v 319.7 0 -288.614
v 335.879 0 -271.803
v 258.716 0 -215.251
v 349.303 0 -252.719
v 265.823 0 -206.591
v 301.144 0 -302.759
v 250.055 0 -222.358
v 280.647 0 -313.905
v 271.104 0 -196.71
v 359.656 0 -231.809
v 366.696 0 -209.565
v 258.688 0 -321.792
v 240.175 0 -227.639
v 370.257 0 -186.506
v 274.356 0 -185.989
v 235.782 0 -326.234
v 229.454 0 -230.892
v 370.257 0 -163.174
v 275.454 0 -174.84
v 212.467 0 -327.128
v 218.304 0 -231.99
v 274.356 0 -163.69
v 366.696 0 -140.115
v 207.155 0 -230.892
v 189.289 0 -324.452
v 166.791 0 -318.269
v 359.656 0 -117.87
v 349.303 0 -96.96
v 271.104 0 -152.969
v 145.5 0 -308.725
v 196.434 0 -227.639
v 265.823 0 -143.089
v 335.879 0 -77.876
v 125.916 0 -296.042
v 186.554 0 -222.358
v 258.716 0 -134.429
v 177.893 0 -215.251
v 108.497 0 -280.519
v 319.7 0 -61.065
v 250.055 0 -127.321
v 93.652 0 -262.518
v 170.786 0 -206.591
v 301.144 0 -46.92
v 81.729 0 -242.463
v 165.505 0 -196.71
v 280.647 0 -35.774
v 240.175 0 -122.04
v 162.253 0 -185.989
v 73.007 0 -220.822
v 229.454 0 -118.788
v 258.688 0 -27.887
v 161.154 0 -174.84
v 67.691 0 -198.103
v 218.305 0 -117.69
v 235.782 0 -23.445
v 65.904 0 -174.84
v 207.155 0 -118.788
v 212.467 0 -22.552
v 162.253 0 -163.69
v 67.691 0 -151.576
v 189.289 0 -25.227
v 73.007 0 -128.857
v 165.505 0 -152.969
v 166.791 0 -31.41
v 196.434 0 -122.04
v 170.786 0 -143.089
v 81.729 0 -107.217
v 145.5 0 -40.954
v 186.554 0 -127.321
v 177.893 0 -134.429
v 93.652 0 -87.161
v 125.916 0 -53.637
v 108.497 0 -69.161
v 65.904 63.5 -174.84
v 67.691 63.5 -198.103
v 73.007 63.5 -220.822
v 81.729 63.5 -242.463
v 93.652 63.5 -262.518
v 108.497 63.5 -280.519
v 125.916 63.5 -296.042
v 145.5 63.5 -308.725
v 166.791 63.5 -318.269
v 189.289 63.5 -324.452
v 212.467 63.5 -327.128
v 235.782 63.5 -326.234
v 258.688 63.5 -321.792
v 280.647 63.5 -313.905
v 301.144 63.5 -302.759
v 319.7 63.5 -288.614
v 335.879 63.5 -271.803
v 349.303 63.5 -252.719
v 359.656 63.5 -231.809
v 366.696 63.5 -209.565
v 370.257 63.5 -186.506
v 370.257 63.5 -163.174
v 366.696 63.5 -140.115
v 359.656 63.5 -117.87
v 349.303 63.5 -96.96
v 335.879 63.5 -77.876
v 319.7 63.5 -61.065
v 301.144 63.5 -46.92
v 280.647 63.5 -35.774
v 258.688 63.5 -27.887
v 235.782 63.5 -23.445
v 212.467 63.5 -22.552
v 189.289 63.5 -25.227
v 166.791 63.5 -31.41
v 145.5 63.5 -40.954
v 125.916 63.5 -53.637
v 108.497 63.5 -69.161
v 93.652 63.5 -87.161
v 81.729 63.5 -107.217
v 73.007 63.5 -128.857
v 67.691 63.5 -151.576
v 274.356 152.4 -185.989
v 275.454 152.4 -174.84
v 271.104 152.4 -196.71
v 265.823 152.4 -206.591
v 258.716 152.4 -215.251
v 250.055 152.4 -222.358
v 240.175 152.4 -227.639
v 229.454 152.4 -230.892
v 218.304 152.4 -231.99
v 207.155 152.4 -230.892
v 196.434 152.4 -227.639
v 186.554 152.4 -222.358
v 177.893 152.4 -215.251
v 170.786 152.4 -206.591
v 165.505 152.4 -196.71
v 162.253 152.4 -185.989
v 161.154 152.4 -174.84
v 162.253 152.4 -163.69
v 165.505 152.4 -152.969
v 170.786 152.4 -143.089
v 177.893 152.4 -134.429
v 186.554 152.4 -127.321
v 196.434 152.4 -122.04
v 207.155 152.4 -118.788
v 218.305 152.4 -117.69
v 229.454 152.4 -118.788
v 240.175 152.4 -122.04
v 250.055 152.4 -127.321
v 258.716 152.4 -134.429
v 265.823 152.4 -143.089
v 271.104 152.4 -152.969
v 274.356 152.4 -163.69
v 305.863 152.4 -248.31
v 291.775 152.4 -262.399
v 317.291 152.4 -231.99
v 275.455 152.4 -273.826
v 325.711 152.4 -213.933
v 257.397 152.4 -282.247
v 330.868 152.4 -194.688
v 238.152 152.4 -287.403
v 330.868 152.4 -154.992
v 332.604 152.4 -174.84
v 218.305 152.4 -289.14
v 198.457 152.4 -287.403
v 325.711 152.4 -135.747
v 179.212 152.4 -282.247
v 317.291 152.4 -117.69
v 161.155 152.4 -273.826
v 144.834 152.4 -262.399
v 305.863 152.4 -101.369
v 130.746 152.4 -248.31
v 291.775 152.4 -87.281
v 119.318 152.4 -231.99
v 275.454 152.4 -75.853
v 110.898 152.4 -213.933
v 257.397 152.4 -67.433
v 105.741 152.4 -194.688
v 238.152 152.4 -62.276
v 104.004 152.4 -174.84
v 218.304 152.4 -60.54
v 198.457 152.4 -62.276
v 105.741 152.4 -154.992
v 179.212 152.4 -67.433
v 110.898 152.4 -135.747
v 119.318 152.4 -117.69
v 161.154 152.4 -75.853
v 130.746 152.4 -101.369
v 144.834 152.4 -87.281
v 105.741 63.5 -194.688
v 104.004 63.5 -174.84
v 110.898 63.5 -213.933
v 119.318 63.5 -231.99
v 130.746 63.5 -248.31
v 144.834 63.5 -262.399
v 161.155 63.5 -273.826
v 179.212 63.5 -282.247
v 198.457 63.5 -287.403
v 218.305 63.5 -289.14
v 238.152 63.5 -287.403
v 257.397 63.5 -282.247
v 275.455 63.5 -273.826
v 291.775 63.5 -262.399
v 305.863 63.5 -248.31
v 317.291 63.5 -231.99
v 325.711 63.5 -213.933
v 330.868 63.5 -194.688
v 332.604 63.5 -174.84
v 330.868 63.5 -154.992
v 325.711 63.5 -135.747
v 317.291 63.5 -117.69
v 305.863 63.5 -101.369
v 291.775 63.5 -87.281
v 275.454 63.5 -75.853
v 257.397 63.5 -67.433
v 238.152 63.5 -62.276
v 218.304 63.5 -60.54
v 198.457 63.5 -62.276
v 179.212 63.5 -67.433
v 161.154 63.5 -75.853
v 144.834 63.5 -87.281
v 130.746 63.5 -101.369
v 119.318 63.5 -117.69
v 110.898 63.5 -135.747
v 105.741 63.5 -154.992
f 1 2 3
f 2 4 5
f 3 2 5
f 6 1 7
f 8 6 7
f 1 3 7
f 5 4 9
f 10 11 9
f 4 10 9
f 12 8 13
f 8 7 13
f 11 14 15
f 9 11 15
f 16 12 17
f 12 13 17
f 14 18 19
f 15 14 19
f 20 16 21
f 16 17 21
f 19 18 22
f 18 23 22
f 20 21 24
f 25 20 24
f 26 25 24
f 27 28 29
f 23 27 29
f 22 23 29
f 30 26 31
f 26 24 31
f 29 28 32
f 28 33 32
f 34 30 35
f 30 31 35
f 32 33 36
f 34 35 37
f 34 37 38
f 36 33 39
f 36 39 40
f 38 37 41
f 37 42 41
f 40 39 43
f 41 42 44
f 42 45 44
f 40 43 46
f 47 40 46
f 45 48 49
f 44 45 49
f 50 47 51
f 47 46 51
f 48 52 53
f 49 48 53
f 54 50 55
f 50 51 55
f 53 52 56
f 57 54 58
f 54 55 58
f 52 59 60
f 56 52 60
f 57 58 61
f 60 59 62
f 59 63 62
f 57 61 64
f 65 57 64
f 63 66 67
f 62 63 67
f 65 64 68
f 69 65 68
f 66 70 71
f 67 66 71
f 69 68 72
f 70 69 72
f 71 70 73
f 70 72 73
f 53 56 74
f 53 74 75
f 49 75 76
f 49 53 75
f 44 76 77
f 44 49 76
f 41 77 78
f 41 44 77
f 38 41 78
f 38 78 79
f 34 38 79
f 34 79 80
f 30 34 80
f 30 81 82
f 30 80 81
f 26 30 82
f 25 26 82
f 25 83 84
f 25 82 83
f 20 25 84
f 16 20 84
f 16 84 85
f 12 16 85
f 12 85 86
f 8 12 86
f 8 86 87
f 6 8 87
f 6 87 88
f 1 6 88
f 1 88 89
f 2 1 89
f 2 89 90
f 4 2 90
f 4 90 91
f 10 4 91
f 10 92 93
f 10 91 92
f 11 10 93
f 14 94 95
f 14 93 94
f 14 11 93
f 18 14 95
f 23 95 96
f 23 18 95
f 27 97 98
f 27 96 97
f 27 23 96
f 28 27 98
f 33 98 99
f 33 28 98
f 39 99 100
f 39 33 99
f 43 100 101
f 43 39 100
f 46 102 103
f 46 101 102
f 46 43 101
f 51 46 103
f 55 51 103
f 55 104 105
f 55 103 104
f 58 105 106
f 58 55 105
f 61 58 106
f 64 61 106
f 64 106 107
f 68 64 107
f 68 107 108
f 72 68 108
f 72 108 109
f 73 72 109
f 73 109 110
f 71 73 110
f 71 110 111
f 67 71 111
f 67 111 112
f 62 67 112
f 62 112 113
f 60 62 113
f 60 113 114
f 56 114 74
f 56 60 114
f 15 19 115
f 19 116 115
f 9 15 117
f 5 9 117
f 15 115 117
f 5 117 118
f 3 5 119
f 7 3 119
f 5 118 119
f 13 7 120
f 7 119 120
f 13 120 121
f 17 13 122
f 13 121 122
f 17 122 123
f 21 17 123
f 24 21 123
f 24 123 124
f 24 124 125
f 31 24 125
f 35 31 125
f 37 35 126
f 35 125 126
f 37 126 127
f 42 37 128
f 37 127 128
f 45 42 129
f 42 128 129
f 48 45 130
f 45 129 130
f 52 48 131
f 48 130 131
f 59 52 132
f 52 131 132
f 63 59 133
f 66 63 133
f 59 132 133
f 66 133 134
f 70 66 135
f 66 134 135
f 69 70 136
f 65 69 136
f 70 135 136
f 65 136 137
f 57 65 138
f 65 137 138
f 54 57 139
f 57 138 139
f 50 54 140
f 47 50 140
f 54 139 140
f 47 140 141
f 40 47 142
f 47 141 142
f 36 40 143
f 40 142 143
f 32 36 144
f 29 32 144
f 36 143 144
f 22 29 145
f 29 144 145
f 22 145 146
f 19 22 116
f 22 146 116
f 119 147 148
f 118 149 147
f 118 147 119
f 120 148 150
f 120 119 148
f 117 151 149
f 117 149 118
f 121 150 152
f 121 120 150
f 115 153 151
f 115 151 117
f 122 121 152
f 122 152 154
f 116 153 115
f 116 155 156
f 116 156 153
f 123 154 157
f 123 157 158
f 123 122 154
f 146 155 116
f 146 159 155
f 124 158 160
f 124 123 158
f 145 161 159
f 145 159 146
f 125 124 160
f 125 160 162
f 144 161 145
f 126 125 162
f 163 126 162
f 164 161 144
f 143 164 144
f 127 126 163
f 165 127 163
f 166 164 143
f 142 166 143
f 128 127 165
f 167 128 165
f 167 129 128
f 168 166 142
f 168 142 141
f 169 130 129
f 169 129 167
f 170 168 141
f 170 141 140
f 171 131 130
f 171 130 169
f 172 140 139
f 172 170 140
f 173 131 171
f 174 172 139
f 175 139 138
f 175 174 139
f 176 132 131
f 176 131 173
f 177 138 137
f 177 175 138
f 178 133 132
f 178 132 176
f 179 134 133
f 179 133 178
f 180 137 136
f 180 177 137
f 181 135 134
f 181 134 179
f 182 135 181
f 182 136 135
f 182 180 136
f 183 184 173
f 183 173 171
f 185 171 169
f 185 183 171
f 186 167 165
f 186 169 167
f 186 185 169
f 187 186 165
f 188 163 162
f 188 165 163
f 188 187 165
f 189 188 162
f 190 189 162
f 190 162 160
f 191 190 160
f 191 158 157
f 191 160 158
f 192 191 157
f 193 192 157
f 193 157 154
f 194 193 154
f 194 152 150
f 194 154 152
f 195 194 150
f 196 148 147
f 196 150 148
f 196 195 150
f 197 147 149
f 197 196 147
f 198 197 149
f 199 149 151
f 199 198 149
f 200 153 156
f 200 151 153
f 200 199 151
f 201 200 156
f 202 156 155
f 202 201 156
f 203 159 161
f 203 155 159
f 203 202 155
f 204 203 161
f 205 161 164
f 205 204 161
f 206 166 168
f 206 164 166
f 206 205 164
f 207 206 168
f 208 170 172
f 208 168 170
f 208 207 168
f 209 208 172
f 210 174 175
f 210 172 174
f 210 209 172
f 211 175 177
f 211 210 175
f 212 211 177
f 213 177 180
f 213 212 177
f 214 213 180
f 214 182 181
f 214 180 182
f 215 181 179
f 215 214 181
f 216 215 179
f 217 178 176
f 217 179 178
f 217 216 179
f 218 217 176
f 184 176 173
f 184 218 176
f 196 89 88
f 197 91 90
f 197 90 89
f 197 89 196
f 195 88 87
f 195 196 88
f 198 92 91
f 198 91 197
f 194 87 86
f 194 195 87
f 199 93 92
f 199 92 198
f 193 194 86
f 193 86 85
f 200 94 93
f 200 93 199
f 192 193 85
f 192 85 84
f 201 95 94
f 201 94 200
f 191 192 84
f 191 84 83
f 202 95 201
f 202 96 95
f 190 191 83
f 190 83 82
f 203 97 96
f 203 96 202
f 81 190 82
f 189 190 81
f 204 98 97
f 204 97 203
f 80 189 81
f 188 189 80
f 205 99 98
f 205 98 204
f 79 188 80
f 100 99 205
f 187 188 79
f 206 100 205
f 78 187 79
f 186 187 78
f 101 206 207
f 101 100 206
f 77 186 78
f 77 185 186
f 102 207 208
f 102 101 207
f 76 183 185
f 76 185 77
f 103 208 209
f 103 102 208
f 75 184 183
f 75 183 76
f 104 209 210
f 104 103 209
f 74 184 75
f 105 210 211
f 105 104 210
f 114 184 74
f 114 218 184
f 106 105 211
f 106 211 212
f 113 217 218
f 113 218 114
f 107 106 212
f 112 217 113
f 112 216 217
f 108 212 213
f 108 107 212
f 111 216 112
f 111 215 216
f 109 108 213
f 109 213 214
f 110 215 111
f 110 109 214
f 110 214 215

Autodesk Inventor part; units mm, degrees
ref_plane "YZ Plane" through (0, 0, 0) normal (1, 0, 0) x (0, 1, 0)
ref_plane "XZ Plane" through (0, 0, 0) normal (0, 1, 0) x (-1, 0, 0)
ref_plane "XY Plane" through (0, 0, 0) normal (0, 0, 1) x (1, 0, 0)
sketch "Sketch1" plane through (0, 0, 0) normal (0, 1, 0) x (-1, 0, 0)
  circle A0 centre (-218.3045, -174.8397) radius 152.4
  circle A1 centre (-218.3045, -174.8397) radius 114.3
  circle A2 centre (-218.3045, -174.8397) radius 57.15
  point P0 (0, 0)
  dimension "d0" = 304.8
  dimension "d1" = 228.6
  dimension "d6" = 114.3
extrude "Extrusion1" add sketch "Sketch1" along normal blind 63.5 contours A0
extrude "Extrusion2" add sketch "Sketch1" along normal blind 152.4 contours A1 | A2
sketch "Sketch2" plane through (218.3045, 152.4, -174.8397) normal (0, 1, 0) x (1, 0, 0)
  circle A0 centre (0, 0) radius 57.15
  point P0 (-218.3045, -174.8397)
  dimension "d7" = 114.3
extrude "Extrusion3" cut sketch "Sketch2" against normal through all
sketch "Sketch3" plane through (218.3045, 63.5, -174.8397) normal (0, 1, 0) x (1, 0, 0)
  circle A0 centre (133.5524, 0) radius 10.16
  circle A1 centre (0, 135.3792) radius 10.16
  circle A2 centre (-132.8036, 0) radius 10.16
  circle A3 centre (0, -134.7909) radius 11.3617
  point P0 (-218.3045, -174.8397)
  dimension "d10" = 20.32
  dimension "d11" = 20.32
  dimension "d12" = 20.32
properties part number "7.2 Part #"
